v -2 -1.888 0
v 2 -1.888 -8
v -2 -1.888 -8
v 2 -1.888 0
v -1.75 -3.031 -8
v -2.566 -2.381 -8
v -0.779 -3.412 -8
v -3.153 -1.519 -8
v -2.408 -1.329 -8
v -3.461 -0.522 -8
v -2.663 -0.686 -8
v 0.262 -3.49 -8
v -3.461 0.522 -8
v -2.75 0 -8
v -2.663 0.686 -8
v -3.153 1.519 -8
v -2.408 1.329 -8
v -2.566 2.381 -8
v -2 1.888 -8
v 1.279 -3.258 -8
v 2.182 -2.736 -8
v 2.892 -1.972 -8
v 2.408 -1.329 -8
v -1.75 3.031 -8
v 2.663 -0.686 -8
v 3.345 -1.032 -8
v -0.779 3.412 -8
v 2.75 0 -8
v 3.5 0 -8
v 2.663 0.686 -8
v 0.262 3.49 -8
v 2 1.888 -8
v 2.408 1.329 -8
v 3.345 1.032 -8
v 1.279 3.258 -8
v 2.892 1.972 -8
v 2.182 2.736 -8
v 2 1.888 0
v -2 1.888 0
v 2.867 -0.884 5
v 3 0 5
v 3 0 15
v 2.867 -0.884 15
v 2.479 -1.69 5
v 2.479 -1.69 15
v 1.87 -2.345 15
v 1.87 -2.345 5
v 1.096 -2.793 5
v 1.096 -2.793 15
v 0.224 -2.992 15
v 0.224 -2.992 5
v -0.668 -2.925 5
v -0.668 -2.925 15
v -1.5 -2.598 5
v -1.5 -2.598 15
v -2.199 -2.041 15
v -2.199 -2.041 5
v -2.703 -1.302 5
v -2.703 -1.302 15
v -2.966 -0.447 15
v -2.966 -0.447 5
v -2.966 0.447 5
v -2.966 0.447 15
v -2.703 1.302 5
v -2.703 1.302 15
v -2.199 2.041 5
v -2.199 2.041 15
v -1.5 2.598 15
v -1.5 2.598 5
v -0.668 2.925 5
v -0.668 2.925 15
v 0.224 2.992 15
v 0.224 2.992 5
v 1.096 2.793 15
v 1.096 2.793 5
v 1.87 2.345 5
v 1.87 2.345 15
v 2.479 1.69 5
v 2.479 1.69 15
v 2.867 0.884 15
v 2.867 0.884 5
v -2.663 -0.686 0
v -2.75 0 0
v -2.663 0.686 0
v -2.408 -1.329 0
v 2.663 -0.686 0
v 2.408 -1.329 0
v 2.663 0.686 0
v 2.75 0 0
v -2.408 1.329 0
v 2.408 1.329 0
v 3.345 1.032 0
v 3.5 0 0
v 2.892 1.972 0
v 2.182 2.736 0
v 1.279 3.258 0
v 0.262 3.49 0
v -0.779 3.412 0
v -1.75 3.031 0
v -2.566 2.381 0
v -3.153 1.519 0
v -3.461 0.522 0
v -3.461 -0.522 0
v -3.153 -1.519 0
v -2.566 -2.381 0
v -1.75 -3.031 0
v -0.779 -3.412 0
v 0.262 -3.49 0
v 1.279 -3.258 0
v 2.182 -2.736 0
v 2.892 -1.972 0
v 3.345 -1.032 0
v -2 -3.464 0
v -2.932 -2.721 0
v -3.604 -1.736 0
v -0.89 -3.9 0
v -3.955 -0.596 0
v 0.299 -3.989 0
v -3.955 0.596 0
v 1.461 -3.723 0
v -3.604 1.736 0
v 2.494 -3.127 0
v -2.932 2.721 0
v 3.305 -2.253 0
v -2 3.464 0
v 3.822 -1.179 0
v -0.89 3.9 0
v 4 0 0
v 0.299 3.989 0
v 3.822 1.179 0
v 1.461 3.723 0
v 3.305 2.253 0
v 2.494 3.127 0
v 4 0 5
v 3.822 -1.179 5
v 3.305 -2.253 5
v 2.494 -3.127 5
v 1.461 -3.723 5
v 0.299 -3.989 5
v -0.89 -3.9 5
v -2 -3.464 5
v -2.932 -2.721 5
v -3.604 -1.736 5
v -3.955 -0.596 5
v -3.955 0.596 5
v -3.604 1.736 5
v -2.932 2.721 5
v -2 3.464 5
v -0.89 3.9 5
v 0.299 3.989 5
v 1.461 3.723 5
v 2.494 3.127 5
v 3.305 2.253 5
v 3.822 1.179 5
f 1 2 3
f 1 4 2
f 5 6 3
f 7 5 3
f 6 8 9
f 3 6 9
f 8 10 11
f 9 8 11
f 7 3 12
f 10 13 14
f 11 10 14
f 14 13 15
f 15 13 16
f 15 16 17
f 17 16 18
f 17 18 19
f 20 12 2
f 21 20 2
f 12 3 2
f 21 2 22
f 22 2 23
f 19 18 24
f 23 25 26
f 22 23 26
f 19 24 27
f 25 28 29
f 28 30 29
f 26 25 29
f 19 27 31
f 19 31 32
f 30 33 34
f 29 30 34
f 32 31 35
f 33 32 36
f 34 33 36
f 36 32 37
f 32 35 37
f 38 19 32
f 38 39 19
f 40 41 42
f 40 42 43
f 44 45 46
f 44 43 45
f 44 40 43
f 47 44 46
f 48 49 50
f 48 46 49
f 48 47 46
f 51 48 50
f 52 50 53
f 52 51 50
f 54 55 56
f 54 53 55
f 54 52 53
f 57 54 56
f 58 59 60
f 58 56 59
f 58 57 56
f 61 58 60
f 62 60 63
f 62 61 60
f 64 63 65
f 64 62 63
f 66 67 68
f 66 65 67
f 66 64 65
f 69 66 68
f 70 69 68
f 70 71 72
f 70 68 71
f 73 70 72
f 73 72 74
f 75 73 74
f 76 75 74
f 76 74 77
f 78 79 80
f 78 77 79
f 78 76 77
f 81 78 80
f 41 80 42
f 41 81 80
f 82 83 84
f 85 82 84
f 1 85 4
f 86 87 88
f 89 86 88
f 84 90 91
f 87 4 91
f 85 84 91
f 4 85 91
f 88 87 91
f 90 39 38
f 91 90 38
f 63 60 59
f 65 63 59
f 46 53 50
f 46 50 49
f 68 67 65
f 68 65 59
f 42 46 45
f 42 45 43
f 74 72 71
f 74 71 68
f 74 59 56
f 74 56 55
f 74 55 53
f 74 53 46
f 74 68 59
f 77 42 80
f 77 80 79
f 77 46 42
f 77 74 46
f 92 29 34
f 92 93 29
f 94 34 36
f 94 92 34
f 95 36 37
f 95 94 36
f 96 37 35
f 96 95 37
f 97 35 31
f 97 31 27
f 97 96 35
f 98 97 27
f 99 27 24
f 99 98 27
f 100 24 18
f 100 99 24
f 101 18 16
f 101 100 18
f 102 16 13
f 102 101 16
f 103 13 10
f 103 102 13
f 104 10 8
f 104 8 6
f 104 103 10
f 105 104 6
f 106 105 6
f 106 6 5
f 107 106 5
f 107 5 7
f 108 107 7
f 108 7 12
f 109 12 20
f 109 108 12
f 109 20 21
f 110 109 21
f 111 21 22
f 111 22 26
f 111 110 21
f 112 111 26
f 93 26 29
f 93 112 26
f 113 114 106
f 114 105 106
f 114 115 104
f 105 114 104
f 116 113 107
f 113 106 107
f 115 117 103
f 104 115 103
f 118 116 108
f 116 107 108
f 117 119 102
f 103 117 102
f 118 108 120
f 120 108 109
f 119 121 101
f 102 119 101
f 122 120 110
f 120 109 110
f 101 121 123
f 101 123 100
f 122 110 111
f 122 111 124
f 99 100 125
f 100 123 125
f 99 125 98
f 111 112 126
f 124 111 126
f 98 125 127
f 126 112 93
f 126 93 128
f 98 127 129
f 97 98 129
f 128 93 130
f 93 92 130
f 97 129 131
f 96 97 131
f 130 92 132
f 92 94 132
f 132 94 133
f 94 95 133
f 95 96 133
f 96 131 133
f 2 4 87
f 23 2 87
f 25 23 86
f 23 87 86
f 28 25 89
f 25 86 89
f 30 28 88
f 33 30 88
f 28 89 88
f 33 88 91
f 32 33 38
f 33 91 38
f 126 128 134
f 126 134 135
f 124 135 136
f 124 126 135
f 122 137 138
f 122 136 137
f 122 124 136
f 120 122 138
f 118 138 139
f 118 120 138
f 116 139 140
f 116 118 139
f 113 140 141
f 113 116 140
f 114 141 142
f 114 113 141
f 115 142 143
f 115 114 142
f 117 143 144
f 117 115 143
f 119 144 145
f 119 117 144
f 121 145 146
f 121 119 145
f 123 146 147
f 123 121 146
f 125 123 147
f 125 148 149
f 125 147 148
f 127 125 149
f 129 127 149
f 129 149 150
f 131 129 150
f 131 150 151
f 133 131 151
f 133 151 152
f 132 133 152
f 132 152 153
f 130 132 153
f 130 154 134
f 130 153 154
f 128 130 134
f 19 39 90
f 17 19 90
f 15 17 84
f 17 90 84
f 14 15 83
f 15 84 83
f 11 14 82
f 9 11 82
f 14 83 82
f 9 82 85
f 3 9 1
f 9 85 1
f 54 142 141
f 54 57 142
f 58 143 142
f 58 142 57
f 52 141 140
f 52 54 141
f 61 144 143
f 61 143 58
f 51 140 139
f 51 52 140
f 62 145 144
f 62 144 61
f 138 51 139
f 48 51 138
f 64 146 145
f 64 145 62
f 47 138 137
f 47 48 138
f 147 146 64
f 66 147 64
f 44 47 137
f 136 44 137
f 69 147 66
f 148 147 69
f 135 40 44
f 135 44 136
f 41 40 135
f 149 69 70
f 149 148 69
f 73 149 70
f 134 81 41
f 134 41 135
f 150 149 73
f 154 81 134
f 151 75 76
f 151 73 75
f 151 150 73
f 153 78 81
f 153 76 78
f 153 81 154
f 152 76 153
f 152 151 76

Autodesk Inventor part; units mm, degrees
ref_plane "YZ Plane" through (0, 0, 0) normal (1, 0, 0) x (0, 1, 0)
ref_plane "XZ Plane" through (0, 0, 0) normal (0, 1, 0) x (-1, 0, 0)
ref_plane "XY Plane" through (0, 0, 0) normal (0, 0, 1) x (1, 0, 0)
sketch "スケッチ1" plane through (0, 0, 0) normal (0, 0, 1) x (1, 0, 0)
  arc A0 (-2, 1.8875) -> (-2, -1.8875) centre (0, 0) ccw projected
  line L0 (-2, 1.8875) -> (2, 1.8875) projected
  line L1 (2, -1.8875) -> (-2, -1.8875) projected
  arc A1 (2, -1.8875) -> (2, 1.8875) centre (0, 0) ccw projected
  circle A2 centre (0, 0) radius 3.5
  point P0 (0, 0)
  dimension "d0" = 7
extrude "押し出し1" add sketch "スケッチ1" against normal blind 8
sketch "スケッチ2" plane through (0, 0, 0) normal (0, 0, 1) x (1, 0, 0)
  circle A0 centre (0, 0) radius 3.5 projected
  circle A1 centre (0, 0) radius 4
  point P0 (0, 0)
  dimension "d3" = 8
extrude "押し出し2" add sketch "スケッチ2" along normal blind 5 contours A0 | A1
sketch "スケッチ3" plane through (0, 0, 5) normal (0, 0, 1) x (1, 0, 0)
  circle A0 centre (0, 0) radius 3
  dimension "d6" = 6
extrude "押し出し3" add sketch "スケッチ3" along normal blind 10
properties part number "カップリング"
